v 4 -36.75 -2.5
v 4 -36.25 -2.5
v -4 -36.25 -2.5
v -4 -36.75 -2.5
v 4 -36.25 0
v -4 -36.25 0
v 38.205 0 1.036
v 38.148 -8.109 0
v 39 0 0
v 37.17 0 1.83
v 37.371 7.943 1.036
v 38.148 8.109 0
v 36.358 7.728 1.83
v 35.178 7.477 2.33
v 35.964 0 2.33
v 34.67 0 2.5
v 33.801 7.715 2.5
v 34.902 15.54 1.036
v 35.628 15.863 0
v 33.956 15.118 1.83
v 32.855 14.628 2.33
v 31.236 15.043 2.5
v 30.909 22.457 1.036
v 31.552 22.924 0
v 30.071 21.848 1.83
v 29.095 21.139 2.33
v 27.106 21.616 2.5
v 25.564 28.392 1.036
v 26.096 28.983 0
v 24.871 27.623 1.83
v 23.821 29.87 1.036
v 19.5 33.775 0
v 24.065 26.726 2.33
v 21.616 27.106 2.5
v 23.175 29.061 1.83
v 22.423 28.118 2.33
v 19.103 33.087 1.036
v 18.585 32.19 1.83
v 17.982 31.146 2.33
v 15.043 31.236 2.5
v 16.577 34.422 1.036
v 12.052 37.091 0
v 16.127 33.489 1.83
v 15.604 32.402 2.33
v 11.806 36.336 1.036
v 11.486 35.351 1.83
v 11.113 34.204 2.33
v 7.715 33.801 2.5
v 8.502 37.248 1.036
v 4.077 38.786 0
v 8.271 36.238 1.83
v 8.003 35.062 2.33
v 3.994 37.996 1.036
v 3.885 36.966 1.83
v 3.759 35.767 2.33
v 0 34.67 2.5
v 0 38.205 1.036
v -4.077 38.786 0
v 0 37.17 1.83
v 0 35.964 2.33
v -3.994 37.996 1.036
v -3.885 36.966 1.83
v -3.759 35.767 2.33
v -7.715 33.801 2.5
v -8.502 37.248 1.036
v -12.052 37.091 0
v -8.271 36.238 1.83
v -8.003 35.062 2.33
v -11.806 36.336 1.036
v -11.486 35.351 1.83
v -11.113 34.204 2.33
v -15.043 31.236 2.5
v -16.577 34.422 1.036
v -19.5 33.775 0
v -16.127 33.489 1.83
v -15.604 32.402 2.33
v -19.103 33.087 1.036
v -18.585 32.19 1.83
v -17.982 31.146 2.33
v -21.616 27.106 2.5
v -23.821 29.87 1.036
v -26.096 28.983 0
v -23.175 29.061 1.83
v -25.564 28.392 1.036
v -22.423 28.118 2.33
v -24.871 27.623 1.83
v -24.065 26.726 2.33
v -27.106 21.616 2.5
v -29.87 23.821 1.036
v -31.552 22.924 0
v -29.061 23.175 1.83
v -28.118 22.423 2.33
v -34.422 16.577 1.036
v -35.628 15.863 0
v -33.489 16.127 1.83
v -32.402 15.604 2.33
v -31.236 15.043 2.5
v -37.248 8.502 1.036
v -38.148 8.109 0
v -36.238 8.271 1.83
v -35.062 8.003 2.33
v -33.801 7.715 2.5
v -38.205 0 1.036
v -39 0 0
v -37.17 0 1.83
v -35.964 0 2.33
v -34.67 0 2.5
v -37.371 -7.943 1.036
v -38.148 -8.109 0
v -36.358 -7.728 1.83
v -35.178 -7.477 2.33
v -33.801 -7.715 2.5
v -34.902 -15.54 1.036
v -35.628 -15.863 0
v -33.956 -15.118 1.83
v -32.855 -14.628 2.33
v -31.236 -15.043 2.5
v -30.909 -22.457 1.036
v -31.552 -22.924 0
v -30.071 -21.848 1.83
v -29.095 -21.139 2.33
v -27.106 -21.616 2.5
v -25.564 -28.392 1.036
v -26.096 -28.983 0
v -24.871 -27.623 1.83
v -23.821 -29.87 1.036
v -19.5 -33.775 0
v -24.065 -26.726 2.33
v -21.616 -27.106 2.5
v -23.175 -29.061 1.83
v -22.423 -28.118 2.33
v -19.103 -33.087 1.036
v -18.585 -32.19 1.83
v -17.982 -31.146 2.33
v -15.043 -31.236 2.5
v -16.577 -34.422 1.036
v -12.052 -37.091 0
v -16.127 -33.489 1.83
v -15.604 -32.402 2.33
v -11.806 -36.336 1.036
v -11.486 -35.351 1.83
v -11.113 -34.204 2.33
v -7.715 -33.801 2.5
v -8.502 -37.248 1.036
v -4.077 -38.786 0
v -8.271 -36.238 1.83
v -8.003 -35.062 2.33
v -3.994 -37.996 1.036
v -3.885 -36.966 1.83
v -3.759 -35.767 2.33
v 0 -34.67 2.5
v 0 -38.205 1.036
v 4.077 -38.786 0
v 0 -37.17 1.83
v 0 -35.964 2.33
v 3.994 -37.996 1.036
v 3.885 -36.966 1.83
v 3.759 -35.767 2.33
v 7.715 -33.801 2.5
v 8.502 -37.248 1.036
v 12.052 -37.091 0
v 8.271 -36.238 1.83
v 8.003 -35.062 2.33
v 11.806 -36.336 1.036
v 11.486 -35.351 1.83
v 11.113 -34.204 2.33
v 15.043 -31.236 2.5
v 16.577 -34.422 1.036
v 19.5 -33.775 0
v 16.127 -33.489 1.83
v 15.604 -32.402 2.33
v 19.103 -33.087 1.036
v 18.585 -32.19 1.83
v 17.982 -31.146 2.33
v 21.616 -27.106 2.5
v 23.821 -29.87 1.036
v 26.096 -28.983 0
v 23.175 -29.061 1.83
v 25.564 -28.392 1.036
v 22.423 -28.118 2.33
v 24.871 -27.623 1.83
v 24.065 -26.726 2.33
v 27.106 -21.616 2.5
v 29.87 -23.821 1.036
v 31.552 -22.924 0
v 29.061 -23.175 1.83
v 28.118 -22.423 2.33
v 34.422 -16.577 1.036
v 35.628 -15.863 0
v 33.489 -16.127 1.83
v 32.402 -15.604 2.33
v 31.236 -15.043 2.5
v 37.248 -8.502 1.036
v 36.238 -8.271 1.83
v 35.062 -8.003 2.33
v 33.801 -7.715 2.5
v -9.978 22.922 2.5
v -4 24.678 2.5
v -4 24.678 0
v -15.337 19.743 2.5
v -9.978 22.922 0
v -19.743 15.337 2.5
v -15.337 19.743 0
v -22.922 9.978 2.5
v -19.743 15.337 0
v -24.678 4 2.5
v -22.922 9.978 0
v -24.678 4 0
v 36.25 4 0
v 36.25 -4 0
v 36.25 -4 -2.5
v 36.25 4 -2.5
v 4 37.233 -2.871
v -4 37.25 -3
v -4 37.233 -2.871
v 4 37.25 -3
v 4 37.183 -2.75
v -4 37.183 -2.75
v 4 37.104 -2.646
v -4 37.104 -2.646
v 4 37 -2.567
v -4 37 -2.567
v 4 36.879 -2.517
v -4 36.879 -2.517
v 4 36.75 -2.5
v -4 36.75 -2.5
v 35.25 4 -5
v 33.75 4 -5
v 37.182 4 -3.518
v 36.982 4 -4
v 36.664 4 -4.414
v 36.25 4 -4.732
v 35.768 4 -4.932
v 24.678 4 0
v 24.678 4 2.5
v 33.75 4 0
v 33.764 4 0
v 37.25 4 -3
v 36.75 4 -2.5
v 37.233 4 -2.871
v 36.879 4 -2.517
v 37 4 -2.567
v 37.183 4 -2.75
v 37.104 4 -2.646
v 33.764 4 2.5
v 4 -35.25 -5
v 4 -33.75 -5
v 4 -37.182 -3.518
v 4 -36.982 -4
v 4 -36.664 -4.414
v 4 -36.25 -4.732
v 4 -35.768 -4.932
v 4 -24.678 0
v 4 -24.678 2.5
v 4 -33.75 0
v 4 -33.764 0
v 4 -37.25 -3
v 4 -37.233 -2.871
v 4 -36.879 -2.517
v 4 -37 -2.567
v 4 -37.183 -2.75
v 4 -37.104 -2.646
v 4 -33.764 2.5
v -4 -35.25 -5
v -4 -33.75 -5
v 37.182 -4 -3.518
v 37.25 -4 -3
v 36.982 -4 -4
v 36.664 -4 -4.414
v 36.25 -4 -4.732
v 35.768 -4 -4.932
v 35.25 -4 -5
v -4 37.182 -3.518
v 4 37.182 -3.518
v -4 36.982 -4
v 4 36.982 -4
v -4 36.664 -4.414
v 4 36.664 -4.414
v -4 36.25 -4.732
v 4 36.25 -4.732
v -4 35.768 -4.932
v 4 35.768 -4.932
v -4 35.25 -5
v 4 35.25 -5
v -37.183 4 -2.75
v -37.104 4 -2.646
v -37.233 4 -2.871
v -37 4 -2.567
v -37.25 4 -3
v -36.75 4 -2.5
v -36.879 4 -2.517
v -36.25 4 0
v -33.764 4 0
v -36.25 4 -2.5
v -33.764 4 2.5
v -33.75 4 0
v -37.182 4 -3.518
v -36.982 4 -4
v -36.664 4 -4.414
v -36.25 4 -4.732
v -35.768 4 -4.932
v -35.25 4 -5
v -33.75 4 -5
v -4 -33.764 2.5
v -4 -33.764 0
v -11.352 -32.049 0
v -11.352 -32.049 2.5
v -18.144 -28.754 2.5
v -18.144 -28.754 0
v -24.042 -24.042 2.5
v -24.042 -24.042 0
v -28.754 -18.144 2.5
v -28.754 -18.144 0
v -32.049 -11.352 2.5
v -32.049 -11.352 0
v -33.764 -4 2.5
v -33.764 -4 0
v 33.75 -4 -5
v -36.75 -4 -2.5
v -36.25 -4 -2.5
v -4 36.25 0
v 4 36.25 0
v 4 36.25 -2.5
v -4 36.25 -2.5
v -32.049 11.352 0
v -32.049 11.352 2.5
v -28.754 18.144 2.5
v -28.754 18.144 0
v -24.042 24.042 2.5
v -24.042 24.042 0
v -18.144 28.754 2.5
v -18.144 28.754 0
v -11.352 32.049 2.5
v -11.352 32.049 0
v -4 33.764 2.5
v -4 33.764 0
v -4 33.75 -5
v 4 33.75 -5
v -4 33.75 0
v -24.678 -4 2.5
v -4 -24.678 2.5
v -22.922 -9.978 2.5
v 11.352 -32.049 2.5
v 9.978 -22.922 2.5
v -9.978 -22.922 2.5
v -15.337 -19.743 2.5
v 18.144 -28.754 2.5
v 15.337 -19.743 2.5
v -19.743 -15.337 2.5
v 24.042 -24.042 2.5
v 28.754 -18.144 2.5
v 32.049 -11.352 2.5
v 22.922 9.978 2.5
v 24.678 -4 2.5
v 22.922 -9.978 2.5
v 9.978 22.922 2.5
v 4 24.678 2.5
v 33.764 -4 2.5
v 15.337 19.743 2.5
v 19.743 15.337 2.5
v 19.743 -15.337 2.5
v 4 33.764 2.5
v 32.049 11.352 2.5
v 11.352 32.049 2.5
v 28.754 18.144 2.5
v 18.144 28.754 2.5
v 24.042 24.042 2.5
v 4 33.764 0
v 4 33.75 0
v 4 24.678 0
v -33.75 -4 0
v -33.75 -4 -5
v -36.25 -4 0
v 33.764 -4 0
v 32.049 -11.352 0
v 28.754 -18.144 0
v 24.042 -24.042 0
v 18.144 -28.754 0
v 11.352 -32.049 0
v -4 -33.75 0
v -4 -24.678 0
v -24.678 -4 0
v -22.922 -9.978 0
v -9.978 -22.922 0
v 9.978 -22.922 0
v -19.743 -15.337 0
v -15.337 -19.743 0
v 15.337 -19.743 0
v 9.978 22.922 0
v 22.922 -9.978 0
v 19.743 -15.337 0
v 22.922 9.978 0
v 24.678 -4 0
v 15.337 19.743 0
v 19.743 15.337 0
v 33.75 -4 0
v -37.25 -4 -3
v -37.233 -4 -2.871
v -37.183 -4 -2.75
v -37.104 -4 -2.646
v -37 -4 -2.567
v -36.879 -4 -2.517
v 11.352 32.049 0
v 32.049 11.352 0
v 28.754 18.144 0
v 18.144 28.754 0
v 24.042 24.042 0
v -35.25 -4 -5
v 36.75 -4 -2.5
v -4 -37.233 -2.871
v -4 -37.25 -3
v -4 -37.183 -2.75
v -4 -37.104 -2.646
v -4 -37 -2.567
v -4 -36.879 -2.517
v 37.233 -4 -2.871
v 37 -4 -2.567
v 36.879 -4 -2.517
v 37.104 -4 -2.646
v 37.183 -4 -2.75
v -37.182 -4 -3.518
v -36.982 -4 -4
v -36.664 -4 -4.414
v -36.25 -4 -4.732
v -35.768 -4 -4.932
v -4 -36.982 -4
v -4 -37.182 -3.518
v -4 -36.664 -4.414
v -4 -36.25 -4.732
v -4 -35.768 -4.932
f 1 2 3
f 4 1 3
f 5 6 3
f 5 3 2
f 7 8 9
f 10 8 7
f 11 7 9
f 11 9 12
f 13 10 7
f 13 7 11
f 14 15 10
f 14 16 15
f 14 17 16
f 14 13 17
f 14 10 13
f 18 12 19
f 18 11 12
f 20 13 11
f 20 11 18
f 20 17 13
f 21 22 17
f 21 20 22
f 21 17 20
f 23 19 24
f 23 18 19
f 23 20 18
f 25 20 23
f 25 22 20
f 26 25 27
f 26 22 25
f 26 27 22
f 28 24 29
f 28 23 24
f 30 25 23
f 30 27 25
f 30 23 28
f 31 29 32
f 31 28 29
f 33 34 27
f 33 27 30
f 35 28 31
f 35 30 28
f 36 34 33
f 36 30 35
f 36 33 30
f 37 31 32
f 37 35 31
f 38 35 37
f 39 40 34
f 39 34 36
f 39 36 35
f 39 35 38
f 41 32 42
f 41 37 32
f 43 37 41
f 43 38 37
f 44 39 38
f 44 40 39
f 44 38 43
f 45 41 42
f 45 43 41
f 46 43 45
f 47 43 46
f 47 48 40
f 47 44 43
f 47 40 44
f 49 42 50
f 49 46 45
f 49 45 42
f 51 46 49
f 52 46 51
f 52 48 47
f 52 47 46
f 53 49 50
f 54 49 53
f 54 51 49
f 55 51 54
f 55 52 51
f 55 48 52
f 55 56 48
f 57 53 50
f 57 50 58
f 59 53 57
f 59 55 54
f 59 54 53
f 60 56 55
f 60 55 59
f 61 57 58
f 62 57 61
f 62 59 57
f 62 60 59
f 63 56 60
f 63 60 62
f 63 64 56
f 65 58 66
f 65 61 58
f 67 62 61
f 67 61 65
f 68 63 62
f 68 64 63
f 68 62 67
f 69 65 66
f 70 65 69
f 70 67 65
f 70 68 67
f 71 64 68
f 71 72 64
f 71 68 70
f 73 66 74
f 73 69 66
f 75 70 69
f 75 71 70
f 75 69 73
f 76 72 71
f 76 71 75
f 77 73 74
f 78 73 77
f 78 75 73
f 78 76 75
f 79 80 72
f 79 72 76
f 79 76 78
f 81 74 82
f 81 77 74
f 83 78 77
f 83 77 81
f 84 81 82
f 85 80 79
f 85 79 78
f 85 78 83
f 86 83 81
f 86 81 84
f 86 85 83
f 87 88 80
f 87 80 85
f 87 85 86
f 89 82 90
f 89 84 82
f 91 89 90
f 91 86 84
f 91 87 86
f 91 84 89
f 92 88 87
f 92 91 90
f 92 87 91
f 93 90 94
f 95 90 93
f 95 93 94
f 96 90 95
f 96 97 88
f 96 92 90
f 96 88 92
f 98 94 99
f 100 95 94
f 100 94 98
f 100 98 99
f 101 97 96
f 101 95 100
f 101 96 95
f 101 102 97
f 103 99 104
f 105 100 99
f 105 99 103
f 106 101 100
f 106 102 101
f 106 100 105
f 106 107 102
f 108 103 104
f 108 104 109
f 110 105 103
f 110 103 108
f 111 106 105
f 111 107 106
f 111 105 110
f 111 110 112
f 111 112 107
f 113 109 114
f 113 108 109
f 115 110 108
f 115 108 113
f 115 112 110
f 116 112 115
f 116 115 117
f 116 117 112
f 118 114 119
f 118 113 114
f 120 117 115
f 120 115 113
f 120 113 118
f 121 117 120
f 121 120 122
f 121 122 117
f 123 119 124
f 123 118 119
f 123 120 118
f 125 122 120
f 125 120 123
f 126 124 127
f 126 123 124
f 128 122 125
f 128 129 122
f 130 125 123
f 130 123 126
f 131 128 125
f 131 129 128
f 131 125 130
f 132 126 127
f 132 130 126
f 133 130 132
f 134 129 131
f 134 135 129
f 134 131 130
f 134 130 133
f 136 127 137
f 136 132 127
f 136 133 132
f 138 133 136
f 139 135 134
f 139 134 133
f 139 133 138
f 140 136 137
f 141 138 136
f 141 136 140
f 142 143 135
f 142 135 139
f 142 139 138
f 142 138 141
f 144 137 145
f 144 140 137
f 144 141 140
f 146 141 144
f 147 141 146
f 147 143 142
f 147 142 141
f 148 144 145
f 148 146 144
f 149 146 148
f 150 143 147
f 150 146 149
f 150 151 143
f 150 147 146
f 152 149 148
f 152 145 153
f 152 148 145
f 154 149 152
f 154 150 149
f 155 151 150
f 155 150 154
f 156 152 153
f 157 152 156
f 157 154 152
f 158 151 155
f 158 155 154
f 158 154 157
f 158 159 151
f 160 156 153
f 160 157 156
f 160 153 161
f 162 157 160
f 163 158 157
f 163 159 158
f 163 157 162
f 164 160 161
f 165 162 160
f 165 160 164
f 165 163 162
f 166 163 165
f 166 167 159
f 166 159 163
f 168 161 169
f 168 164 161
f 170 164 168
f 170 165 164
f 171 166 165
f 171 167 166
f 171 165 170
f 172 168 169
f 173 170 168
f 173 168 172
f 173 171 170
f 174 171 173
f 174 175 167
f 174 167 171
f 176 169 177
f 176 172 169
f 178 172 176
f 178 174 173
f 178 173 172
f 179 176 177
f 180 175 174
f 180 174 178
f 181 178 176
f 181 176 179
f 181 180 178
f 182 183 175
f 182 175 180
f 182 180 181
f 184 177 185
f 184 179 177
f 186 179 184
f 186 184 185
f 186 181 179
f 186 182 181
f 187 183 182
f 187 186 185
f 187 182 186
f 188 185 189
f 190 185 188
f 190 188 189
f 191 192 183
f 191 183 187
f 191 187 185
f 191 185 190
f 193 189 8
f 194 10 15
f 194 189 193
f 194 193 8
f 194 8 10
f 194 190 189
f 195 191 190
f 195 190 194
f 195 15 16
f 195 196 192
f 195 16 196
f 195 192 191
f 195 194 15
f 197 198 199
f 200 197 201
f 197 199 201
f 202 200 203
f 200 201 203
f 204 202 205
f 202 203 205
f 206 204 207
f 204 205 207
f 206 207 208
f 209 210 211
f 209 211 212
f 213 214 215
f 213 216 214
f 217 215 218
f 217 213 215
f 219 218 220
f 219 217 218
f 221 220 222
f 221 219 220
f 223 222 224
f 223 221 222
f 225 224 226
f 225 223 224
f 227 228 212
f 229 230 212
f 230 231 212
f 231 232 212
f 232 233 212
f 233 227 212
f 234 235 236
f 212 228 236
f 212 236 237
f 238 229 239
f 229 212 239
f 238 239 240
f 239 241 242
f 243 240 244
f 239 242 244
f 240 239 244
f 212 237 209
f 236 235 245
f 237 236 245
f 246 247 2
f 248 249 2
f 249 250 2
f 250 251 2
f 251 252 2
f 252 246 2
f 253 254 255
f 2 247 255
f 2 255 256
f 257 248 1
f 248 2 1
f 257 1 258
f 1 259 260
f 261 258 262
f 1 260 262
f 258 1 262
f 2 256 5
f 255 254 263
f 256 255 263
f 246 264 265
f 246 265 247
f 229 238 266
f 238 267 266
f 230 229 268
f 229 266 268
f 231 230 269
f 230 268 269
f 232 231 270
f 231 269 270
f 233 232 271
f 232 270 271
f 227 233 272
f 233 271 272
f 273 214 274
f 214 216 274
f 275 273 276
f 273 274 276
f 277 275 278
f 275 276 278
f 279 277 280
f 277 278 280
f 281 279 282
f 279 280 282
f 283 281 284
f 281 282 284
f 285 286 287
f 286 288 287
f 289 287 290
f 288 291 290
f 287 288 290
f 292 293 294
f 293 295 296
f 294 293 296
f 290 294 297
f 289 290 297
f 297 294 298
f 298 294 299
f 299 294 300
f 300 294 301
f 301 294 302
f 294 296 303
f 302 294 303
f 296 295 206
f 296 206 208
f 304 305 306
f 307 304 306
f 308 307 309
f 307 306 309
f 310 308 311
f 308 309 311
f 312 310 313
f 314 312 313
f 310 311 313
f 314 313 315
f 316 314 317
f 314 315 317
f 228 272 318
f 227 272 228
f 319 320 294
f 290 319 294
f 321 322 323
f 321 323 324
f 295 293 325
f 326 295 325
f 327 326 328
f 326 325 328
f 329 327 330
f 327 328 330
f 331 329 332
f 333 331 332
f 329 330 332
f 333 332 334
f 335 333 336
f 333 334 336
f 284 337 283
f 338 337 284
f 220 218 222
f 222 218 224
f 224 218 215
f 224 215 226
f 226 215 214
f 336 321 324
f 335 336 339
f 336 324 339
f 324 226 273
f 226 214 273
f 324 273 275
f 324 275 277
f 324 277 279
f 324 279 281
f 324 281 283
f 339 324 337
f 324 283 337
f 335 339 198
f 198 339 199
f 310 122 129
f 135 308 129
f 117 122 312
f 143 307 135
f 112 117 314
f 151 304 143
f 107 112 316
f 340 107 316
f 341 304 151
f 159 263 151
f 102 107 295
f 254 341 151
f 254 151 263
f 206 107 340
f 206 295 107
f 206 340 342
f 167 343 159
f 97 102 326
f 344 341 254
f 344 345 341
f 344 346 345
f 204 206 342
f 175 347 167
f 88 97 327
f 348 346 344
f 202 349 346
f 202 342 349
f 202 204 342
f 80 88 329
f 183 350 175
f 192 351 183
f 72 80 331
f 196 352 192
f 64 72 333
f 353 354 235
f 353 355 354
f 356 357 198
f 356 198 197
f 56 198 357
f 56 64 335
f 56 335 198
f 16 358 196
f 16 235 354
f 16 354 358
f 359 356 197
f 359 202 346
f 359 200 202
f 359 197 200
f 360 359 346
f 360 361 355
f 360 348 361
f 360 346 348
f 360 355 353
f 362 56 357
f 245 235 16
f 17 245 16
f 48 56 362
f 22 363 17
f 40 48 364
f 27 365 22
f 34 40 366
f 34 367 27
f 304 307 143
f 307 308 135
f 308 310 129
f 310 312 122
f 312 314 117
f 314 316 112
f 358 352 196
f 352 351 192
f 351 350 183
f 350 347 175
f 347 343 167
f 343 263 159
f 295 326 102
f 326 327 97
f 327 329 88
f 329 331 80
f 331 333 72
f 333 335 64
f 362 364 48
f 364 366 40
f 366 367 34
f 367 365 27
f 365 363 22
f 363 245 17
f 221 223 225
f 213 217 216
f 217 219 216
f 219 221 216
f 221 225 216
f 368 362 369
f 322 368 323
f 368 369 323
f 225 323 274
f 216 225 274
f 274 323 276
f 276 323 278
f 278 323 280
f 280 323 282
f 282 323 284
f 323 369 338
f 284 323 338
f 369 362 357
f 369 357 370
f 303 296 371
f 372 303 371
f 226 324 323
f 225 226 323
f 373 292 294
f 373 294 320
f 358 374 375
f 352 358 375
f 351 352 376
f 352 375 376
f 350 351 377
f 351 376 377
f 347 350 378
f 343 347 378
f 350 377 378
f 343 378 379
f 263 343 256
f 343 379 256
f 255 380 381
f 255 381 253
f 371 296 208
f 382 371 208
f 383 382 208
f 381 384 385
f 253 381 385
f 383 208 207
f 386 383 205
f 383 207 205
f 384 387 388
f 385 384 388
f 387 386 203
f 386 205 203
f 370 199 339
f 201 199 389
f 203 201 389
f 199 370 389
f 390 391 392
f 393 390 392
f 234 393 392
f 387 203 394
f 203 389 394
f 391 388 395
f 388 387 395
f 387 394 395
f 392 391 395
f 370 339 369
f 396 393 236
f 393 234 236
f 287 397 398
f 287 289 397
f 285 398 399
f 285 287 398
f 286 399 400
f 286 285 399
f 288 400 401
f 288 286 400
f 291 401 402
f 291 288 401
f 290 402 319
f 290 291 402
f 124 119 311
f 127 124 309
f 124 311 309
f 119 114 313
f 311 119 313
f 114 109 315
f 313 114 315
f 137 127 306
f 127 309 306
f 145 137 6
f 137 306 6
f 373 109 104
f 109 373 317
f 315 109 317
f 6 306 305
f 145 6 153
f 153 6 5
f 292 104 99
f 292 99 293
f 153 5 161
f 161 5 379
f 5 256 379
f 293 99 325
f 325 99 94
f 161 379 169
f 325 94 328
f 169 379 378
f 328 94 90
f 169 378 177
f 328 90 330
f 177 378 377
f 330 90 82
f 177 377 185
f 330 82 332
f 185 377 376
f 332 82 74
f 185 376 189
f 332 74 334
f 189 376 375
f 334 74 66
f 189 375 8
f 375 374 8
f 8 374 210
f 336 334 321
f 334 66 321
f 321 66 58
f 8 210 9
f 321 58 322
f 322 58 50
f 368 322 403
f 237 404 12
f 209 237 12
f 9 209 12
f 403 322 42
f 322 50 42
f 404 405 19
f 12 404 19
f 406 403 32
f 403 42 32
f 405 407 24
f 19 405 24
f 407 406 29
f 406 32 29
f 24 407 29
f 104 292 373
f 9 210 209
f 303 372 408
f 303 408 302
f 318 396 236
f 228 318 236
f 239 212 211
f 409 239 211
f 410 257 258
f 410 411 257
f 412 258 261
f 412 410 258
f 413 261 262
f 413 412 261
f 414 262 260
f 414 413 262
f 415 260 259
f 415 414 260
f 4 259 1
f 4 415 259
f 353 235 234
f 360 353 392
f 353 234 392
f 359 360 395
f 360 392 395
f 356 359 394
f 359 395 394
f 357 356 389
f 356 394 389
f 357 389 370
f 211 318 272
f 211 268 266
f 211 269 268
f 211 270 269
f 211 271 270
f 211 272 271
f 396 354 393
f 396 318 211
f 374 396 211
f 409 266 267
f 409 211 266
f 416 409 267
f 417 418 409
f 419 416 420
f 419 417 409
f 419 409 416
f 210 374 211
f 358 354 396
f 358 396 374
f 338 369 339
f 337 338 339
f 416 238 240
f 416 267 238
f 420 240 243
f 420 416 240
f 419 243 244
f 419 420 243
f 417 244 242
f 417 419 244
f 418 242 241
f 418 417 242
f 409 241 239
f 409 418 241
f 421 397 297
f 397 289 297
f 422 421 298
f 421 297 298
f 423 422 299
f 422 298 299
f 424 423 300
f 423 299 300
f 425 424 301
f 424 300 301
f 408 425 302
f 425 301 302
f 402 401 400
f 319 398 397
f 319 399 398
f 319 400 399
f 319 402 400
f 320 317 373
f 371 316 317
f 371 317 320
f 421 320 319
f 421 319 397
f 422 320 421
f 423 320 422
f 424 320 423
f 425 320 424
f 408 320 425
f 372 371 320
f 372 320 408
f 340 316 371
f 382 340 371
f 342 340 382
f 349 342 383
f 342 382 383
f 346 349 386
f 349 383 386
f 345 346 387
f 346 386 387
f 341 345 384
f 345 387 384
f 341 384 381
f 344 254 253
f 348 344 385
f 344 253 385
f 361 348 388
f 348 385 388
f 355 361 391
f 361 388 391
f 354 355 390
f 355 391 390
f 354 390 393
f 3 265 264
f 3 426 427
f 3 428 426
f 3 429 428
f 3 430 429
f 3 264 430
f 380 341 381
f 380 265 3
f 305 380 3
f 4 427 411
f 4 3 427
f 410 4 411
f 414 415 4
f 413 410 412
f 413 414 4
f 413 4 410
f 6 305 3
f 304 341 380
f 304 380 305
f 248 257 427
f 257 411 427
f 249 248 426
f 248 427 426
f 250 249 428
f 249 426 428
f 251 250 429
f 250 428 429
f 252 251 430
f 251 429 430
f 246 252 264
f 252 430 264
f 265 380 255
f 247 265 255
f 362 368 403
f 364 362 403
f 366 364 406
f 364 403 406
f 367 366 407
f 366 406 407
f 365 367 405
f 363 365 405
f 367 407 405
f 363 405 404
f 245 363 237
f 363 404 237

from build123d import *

# Parameters (mm, degrees)
SKETCH_1_R                       = 39
EXTRUDE_1_DEPTH                  = 2.5
FILLET_1_R                       = 5
SKETCH_2_W                       = 8
SKETCH_2_H                       = 2.5
EXTRUDE_2_DEPTH                  = 5
SKETCH_3_W                       = 8
SKETCH_3_H                       = 2.5
EXTRUDE_3_DEPTH                  = 1
FILLET_4_R                       = 0.5
FILLET_5_R                       = 2
PATTERN_CIRCULAR_7_COUNT         = 4
FILLET_4_OF_PATTERN_CIRCULAR_7_R = 0.5
FILLET_5_OF_PATTERN_CIRCULAR_7_R = 2
CUT_EXTRUDE_1_DEPTH              = 56.380501984
PATTERN_CIRCULAR_8_COUNT         = 4


# Some blends are built 0.0001 mm under size
with BuildPart() as part:
    # ｽｹｯﾁ1 → ﾎﾞｽ - 押し出し1 (new body)
    with BuildSketch(Plane.XY):
        Circle(SKETCH_1_R)
    extrude(amount=EXTRUDE_1_DEPTH)

    # ﾌｨﾚｯﾄ1
    # the kernel refuses this fillet: 5 mm, written as the material it takes off along each edge
    with BuildSketch(Plane(origin=(0, 0, 2.5), x_dir=(1, 0, 0), z_dir=(0, -1, 0))) as fillet_1_piece_1:
        with BuildLine():
            CenterArc((34.669872981, -5), FILLET_1_R, 30, 60)
            Line((34.669872981, 0), (34.669872981, 0.1))
            Line((34.669872981, 0.1), (39, 0.1))
            Line((39, 0.1), (39.1, 0))
            ThreePointArc((39.1, 0), (39.1, -1.25), (39.08660254, -2.45))
            Line((39.08660254, -2.45), (39, -2.5))
        make_face()
    revolve(axis=Axis((0, 0, 2.5), (0, 0, 1)), mode=Mode.SUBTRACT)

    # ｽｹｯﾁ2 → ﾎﾞｽ - 押し出し2 (add)
    with BuildSketch(Plane(origin=(0, 0, 0), x_dir=(-1, 0, 0), z_dir=(0, 0, -1))):
        with Locations((0, 35)):
            Rectangle(SKETCH_2_W, SKETCH_2_H)
    extrude_2 = extrude(amount=EXTRUDE_2_DEPTH)

    # ｽｹｯﾁ3 → ﾎﾞｽ - 押し出し3 (add)
    with BuildSketch(Plane(origin=(0, 36.25, 0), x_dir=(1, 0, 0), z_dir=(0, 1, 0))):
        with Locations((0, 3.75)):
            Rectangle(SKETCH_3_W, SKETCH_3_H)
    extrude_3 = extrude(amount=EXTRUDE_3_DEPTH)

    # ﾌｨﾚｯﾄ4
    fillet_4_edges = [part.edges().sort_by_distance(p)[0] for p in [
        (0, 37.25, -2.5),
    ]]
    fillet(fillet_4_edges, radius=FILLET_4_R)

    # ﾌｨﾚｯﾄ5
    fillet_5_edges = [part.edges().sort_by_distance(p)[0] for p in [
        (0, 37.25, -5),
    ]]
    fillet(fillet_5_edges, radius=FILLET_5_R - 0.0001)  # a hair under: the kernel refuses the full size

    # 円形ﾊﾟﾀｰﾝ7: ﾎﾞｽ - 押し出し2, ﾎﾞｽ - 押し出し3 ×4 about axis
    pattern_circular_7_axis = Axis((0, 0, 0), (0, 0, 1))
    add([extrude_2.rotate(pattern_circular_7_axis, i * 360 / PATTERN_CIRCULAR_7_COUNT) for i in range(1, PATTERN_CIRCULAR_7_COUNT)])
    add([extrude_3.rotate(pattern_circular_7_axis, i * 360 / PATTERN_CIRCULAR_7_COUNT) for i in range(1, PATTERN_CIRCULAR_7_COUNT)])

    # ﾌｨﾚｯﾄ4 of 円形ﾊﾟﾀｰﾝ7
    fillet_4_of_pattern_circular_7_edges = [part.edges().sort_by_distance(p)[0] for p in [
        (-37.25, 0, -2.5),
        (0, -37.25, -2.5),
        (37.25, 0, -2.5),
    ]]
    fillet(fillet_4_of_pattern_circular_7_edges, radius=FILLET_4_OF_PATTERN_CIRCULAR_7_R)

    # ﾌｨﾚｯﾄ5 of 円形ﾊﾟﾀｰﾝ7
    fillet_5_of_pattern_circular_7_edges = [part.edges().sort_by_distance(p)[0] for p in [
        (-37.25, 0, -5),
        (0, -37.25, -5),
        (37.25, 0, -5),
    ]]
    fillet(fillet_5_of_pattern_circular_7_edges, radius=FILLET_5_OF_PATTERN_CIRCULAR_7_R - 0.0001)  # a hair under: the kernel refuses the full size

    # ｽｹｯﾁ7 → ｶｯﾄ - 押し出し1 (cut, through all)
    with BuildSketch(Plane(origin=(0, 0, 0), x_dir=(-1, 0, 0), z_dir=(0, 0, -1))):
        with BuildLine():
            Line((24.677925359, 4), (33.763886032, 4))
            ThreePointArc((33.763886032, 4), (24.04163056, 24.04163056), (4, 33.763886032))
            Line((4, 33.763886032), (4, 24.677925359))
            ThreePointArc((4, 24.677925359), (17.67766953, 17.67766953), (24.677925359, 4))
        make_face()
    cut_extrude_1 = extrude(amount=-CUT_EXTRUDE_1_DEPTH, mode=Mode.SUBTRACT)

    # 円形ﾊﾟﾀｰﾝ8: ｶｯﾄ - 押し出し1 ×4 about axis
    pattern_circular_8_axis = Axis((0, 0, 0), (0, 0, -1))
    for i in range(1, PATTERN_CIRCULAR_8_COUNT):
        add(cut_extrude_1.rotate(pattern_circular_8_axis, i * 360 / PATTERN_CIRCULAR_8_COUNT), mode=Mode.SUBTRACT)


solid = part.part
